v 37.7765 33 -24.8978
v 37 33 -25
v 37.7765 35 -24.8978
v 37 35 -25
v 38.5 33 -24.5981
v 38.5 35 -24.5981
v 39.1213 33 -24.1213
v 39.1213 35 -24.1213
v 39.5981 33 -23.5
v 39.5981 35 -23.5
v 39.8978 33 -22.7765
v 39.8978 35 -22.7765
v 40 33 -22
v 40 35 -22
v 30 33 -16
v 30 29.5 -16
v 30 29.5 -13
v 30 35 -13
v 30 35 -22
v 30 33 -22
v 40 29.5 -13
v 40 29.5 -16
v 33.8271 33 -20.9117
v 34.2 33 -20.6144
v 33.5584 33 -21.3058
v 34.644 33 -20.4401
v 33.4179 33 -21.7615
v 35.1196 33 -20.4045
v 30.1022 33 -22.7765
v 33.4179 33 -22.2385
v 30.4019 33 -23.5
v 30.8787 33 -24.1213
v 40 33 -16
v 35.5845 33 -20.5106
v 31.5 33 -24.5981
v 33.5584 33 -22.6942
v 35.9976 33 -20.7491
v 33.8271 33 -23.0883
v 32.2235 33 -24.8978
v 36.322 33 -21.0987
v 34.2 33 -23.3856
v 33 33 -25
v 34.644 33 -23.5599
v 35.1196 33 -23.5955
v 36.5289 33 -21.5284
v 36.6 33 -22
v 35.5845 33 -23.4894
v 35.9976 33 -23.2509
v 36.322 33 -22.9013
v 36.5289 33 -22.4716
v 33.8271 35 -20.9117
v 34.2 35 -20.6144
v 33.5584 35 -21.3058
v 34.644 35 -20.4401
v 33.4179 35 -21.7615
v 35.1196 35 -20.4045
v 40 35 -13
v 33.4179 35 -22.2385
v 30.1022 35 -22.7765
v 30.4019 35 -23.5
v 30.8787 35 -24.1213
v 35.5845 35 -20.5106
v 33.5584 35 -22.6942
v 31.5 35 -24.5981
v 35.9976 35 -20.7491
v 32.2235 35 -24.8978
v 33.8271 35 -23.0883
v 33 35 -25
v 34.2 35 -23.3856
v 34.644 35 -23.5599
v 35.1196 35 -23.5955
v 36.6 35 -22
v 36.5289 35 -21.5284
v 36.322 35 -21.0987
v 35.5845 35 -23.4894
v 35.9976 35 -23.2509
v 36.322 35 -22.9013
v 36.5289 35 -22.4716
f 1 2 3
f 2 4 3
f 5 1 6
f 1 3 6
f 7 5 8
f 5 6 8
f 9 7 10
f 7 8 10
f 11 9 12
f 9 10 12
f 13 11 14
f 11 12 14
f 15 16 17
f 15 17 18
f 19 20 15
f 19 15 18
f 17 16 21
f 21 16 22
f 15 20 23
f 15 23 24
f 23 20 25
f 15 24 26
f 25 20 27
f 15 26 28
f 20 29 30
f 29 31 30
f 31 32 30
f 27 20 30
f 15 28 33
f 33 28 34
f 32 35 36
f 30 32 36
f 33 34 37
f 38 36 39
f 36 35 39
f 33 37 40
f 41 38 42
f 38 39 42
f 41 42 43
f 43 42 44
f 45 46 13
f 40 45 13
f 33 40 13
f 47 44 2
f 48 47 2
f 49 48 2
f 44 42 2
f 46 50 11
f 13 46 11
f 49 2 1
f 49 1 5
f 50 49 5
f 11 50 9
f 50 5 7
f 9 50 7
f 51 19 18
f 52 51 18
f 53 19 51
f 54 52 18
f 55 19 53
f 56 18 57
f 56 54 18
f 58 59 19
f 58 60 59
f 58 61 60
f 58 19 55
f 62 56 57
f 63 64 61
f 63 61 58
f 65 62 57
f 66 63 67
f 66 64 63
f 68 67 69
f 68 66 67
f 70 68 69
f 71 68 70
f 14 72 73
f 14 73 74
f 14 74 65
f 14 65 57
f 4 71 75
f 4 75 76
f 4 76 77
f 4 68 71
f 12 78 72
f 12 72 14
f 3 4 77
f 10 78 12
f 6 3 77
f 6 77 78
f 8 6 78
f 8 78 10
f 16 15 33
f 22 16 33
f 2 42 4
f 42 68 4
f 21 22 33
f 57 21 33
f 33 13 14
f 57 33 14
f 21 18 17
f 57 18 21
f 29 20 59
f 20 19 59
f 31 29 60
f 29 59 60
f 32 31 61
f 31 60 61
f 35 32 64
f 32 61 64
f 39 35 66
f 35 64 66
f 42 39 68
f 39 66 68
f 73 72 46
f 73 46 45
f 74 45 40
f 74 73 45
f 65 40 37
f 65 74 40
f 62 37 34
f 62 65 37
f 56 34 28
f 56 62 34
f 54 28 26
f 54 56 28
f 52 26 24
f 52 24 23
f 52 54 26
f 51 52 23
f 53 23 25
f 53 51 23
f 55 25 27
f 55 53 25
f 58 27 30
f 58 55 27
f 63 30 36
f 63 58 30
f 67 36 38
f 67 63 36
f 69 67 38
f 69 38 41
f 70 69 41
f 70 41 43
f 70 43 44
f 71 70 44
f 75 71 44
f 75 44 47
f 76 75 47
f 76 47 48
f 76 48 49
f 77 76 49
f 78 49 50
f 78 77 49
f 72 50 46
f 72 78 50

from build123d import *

# Parameters (mm, degrees)
BOX184_W          = 10
BOX184_H          = 3.5
BOX184_DEPTH      = 3
CYLINDER071_R     = 1.6
CYLINDER071_DEPTH = 2
BOX182_W          = 10
BOX182_H          = 2
BOX182_DEPTH      = 12
FILLET041_R       = 3


with BuildPart() as cube173:
    # Box184 → Box184 (new body)
    with BuildSketch(Plane(origin=(30, 29.5, -16), x_dir=(1, 0, 0), z_dir=(0, 0, 1))):
        with Locations((5, 1.75)):
            Rectangle(BOX184_W, BOX184_H)
    extrude(amount=BOX184_DEPTH)


with BuildPart() as cylinder152:
    # Cylinder071 → Cylinder071 (new body)
    with BuildSketch(Plane(origin=(35, 35, -22), x_dir=(1, 0, 0), z_dir=(0, -1, 0))):
        Circle(CYLINDER071_R)
    extrude(amount=CYLINDER071_DEPTH)


with BuildPart() as fusion057:
    # Box182 → Box182 (new body)
    with BuildSketch(Plane(origin=(30, 33, -25), x_dir=(1, 0, 0), z_dir=(0, 0, 1))):
        with Locations((5, 1)):
            Rectangle(BOX182_W, BOX182_H)
    extrude(amount=BOX182_DEPTH)

    # Cut096: cut Cylinder152
    add(cylinder152.part, mode=Mode.SUBTRACT)

    # Fillet041
    fillet041_edges = [fusion057.edges().sort_by_distance(p)[0] for p in [
        (30, 34, -25),
        (40, 34, -25),
    ]]
    fillet(fillet041_edges, radius=FILLET041_R)

    # Fusion057: union Cube173
    add(cube173.part)


solid = fusion057.part
